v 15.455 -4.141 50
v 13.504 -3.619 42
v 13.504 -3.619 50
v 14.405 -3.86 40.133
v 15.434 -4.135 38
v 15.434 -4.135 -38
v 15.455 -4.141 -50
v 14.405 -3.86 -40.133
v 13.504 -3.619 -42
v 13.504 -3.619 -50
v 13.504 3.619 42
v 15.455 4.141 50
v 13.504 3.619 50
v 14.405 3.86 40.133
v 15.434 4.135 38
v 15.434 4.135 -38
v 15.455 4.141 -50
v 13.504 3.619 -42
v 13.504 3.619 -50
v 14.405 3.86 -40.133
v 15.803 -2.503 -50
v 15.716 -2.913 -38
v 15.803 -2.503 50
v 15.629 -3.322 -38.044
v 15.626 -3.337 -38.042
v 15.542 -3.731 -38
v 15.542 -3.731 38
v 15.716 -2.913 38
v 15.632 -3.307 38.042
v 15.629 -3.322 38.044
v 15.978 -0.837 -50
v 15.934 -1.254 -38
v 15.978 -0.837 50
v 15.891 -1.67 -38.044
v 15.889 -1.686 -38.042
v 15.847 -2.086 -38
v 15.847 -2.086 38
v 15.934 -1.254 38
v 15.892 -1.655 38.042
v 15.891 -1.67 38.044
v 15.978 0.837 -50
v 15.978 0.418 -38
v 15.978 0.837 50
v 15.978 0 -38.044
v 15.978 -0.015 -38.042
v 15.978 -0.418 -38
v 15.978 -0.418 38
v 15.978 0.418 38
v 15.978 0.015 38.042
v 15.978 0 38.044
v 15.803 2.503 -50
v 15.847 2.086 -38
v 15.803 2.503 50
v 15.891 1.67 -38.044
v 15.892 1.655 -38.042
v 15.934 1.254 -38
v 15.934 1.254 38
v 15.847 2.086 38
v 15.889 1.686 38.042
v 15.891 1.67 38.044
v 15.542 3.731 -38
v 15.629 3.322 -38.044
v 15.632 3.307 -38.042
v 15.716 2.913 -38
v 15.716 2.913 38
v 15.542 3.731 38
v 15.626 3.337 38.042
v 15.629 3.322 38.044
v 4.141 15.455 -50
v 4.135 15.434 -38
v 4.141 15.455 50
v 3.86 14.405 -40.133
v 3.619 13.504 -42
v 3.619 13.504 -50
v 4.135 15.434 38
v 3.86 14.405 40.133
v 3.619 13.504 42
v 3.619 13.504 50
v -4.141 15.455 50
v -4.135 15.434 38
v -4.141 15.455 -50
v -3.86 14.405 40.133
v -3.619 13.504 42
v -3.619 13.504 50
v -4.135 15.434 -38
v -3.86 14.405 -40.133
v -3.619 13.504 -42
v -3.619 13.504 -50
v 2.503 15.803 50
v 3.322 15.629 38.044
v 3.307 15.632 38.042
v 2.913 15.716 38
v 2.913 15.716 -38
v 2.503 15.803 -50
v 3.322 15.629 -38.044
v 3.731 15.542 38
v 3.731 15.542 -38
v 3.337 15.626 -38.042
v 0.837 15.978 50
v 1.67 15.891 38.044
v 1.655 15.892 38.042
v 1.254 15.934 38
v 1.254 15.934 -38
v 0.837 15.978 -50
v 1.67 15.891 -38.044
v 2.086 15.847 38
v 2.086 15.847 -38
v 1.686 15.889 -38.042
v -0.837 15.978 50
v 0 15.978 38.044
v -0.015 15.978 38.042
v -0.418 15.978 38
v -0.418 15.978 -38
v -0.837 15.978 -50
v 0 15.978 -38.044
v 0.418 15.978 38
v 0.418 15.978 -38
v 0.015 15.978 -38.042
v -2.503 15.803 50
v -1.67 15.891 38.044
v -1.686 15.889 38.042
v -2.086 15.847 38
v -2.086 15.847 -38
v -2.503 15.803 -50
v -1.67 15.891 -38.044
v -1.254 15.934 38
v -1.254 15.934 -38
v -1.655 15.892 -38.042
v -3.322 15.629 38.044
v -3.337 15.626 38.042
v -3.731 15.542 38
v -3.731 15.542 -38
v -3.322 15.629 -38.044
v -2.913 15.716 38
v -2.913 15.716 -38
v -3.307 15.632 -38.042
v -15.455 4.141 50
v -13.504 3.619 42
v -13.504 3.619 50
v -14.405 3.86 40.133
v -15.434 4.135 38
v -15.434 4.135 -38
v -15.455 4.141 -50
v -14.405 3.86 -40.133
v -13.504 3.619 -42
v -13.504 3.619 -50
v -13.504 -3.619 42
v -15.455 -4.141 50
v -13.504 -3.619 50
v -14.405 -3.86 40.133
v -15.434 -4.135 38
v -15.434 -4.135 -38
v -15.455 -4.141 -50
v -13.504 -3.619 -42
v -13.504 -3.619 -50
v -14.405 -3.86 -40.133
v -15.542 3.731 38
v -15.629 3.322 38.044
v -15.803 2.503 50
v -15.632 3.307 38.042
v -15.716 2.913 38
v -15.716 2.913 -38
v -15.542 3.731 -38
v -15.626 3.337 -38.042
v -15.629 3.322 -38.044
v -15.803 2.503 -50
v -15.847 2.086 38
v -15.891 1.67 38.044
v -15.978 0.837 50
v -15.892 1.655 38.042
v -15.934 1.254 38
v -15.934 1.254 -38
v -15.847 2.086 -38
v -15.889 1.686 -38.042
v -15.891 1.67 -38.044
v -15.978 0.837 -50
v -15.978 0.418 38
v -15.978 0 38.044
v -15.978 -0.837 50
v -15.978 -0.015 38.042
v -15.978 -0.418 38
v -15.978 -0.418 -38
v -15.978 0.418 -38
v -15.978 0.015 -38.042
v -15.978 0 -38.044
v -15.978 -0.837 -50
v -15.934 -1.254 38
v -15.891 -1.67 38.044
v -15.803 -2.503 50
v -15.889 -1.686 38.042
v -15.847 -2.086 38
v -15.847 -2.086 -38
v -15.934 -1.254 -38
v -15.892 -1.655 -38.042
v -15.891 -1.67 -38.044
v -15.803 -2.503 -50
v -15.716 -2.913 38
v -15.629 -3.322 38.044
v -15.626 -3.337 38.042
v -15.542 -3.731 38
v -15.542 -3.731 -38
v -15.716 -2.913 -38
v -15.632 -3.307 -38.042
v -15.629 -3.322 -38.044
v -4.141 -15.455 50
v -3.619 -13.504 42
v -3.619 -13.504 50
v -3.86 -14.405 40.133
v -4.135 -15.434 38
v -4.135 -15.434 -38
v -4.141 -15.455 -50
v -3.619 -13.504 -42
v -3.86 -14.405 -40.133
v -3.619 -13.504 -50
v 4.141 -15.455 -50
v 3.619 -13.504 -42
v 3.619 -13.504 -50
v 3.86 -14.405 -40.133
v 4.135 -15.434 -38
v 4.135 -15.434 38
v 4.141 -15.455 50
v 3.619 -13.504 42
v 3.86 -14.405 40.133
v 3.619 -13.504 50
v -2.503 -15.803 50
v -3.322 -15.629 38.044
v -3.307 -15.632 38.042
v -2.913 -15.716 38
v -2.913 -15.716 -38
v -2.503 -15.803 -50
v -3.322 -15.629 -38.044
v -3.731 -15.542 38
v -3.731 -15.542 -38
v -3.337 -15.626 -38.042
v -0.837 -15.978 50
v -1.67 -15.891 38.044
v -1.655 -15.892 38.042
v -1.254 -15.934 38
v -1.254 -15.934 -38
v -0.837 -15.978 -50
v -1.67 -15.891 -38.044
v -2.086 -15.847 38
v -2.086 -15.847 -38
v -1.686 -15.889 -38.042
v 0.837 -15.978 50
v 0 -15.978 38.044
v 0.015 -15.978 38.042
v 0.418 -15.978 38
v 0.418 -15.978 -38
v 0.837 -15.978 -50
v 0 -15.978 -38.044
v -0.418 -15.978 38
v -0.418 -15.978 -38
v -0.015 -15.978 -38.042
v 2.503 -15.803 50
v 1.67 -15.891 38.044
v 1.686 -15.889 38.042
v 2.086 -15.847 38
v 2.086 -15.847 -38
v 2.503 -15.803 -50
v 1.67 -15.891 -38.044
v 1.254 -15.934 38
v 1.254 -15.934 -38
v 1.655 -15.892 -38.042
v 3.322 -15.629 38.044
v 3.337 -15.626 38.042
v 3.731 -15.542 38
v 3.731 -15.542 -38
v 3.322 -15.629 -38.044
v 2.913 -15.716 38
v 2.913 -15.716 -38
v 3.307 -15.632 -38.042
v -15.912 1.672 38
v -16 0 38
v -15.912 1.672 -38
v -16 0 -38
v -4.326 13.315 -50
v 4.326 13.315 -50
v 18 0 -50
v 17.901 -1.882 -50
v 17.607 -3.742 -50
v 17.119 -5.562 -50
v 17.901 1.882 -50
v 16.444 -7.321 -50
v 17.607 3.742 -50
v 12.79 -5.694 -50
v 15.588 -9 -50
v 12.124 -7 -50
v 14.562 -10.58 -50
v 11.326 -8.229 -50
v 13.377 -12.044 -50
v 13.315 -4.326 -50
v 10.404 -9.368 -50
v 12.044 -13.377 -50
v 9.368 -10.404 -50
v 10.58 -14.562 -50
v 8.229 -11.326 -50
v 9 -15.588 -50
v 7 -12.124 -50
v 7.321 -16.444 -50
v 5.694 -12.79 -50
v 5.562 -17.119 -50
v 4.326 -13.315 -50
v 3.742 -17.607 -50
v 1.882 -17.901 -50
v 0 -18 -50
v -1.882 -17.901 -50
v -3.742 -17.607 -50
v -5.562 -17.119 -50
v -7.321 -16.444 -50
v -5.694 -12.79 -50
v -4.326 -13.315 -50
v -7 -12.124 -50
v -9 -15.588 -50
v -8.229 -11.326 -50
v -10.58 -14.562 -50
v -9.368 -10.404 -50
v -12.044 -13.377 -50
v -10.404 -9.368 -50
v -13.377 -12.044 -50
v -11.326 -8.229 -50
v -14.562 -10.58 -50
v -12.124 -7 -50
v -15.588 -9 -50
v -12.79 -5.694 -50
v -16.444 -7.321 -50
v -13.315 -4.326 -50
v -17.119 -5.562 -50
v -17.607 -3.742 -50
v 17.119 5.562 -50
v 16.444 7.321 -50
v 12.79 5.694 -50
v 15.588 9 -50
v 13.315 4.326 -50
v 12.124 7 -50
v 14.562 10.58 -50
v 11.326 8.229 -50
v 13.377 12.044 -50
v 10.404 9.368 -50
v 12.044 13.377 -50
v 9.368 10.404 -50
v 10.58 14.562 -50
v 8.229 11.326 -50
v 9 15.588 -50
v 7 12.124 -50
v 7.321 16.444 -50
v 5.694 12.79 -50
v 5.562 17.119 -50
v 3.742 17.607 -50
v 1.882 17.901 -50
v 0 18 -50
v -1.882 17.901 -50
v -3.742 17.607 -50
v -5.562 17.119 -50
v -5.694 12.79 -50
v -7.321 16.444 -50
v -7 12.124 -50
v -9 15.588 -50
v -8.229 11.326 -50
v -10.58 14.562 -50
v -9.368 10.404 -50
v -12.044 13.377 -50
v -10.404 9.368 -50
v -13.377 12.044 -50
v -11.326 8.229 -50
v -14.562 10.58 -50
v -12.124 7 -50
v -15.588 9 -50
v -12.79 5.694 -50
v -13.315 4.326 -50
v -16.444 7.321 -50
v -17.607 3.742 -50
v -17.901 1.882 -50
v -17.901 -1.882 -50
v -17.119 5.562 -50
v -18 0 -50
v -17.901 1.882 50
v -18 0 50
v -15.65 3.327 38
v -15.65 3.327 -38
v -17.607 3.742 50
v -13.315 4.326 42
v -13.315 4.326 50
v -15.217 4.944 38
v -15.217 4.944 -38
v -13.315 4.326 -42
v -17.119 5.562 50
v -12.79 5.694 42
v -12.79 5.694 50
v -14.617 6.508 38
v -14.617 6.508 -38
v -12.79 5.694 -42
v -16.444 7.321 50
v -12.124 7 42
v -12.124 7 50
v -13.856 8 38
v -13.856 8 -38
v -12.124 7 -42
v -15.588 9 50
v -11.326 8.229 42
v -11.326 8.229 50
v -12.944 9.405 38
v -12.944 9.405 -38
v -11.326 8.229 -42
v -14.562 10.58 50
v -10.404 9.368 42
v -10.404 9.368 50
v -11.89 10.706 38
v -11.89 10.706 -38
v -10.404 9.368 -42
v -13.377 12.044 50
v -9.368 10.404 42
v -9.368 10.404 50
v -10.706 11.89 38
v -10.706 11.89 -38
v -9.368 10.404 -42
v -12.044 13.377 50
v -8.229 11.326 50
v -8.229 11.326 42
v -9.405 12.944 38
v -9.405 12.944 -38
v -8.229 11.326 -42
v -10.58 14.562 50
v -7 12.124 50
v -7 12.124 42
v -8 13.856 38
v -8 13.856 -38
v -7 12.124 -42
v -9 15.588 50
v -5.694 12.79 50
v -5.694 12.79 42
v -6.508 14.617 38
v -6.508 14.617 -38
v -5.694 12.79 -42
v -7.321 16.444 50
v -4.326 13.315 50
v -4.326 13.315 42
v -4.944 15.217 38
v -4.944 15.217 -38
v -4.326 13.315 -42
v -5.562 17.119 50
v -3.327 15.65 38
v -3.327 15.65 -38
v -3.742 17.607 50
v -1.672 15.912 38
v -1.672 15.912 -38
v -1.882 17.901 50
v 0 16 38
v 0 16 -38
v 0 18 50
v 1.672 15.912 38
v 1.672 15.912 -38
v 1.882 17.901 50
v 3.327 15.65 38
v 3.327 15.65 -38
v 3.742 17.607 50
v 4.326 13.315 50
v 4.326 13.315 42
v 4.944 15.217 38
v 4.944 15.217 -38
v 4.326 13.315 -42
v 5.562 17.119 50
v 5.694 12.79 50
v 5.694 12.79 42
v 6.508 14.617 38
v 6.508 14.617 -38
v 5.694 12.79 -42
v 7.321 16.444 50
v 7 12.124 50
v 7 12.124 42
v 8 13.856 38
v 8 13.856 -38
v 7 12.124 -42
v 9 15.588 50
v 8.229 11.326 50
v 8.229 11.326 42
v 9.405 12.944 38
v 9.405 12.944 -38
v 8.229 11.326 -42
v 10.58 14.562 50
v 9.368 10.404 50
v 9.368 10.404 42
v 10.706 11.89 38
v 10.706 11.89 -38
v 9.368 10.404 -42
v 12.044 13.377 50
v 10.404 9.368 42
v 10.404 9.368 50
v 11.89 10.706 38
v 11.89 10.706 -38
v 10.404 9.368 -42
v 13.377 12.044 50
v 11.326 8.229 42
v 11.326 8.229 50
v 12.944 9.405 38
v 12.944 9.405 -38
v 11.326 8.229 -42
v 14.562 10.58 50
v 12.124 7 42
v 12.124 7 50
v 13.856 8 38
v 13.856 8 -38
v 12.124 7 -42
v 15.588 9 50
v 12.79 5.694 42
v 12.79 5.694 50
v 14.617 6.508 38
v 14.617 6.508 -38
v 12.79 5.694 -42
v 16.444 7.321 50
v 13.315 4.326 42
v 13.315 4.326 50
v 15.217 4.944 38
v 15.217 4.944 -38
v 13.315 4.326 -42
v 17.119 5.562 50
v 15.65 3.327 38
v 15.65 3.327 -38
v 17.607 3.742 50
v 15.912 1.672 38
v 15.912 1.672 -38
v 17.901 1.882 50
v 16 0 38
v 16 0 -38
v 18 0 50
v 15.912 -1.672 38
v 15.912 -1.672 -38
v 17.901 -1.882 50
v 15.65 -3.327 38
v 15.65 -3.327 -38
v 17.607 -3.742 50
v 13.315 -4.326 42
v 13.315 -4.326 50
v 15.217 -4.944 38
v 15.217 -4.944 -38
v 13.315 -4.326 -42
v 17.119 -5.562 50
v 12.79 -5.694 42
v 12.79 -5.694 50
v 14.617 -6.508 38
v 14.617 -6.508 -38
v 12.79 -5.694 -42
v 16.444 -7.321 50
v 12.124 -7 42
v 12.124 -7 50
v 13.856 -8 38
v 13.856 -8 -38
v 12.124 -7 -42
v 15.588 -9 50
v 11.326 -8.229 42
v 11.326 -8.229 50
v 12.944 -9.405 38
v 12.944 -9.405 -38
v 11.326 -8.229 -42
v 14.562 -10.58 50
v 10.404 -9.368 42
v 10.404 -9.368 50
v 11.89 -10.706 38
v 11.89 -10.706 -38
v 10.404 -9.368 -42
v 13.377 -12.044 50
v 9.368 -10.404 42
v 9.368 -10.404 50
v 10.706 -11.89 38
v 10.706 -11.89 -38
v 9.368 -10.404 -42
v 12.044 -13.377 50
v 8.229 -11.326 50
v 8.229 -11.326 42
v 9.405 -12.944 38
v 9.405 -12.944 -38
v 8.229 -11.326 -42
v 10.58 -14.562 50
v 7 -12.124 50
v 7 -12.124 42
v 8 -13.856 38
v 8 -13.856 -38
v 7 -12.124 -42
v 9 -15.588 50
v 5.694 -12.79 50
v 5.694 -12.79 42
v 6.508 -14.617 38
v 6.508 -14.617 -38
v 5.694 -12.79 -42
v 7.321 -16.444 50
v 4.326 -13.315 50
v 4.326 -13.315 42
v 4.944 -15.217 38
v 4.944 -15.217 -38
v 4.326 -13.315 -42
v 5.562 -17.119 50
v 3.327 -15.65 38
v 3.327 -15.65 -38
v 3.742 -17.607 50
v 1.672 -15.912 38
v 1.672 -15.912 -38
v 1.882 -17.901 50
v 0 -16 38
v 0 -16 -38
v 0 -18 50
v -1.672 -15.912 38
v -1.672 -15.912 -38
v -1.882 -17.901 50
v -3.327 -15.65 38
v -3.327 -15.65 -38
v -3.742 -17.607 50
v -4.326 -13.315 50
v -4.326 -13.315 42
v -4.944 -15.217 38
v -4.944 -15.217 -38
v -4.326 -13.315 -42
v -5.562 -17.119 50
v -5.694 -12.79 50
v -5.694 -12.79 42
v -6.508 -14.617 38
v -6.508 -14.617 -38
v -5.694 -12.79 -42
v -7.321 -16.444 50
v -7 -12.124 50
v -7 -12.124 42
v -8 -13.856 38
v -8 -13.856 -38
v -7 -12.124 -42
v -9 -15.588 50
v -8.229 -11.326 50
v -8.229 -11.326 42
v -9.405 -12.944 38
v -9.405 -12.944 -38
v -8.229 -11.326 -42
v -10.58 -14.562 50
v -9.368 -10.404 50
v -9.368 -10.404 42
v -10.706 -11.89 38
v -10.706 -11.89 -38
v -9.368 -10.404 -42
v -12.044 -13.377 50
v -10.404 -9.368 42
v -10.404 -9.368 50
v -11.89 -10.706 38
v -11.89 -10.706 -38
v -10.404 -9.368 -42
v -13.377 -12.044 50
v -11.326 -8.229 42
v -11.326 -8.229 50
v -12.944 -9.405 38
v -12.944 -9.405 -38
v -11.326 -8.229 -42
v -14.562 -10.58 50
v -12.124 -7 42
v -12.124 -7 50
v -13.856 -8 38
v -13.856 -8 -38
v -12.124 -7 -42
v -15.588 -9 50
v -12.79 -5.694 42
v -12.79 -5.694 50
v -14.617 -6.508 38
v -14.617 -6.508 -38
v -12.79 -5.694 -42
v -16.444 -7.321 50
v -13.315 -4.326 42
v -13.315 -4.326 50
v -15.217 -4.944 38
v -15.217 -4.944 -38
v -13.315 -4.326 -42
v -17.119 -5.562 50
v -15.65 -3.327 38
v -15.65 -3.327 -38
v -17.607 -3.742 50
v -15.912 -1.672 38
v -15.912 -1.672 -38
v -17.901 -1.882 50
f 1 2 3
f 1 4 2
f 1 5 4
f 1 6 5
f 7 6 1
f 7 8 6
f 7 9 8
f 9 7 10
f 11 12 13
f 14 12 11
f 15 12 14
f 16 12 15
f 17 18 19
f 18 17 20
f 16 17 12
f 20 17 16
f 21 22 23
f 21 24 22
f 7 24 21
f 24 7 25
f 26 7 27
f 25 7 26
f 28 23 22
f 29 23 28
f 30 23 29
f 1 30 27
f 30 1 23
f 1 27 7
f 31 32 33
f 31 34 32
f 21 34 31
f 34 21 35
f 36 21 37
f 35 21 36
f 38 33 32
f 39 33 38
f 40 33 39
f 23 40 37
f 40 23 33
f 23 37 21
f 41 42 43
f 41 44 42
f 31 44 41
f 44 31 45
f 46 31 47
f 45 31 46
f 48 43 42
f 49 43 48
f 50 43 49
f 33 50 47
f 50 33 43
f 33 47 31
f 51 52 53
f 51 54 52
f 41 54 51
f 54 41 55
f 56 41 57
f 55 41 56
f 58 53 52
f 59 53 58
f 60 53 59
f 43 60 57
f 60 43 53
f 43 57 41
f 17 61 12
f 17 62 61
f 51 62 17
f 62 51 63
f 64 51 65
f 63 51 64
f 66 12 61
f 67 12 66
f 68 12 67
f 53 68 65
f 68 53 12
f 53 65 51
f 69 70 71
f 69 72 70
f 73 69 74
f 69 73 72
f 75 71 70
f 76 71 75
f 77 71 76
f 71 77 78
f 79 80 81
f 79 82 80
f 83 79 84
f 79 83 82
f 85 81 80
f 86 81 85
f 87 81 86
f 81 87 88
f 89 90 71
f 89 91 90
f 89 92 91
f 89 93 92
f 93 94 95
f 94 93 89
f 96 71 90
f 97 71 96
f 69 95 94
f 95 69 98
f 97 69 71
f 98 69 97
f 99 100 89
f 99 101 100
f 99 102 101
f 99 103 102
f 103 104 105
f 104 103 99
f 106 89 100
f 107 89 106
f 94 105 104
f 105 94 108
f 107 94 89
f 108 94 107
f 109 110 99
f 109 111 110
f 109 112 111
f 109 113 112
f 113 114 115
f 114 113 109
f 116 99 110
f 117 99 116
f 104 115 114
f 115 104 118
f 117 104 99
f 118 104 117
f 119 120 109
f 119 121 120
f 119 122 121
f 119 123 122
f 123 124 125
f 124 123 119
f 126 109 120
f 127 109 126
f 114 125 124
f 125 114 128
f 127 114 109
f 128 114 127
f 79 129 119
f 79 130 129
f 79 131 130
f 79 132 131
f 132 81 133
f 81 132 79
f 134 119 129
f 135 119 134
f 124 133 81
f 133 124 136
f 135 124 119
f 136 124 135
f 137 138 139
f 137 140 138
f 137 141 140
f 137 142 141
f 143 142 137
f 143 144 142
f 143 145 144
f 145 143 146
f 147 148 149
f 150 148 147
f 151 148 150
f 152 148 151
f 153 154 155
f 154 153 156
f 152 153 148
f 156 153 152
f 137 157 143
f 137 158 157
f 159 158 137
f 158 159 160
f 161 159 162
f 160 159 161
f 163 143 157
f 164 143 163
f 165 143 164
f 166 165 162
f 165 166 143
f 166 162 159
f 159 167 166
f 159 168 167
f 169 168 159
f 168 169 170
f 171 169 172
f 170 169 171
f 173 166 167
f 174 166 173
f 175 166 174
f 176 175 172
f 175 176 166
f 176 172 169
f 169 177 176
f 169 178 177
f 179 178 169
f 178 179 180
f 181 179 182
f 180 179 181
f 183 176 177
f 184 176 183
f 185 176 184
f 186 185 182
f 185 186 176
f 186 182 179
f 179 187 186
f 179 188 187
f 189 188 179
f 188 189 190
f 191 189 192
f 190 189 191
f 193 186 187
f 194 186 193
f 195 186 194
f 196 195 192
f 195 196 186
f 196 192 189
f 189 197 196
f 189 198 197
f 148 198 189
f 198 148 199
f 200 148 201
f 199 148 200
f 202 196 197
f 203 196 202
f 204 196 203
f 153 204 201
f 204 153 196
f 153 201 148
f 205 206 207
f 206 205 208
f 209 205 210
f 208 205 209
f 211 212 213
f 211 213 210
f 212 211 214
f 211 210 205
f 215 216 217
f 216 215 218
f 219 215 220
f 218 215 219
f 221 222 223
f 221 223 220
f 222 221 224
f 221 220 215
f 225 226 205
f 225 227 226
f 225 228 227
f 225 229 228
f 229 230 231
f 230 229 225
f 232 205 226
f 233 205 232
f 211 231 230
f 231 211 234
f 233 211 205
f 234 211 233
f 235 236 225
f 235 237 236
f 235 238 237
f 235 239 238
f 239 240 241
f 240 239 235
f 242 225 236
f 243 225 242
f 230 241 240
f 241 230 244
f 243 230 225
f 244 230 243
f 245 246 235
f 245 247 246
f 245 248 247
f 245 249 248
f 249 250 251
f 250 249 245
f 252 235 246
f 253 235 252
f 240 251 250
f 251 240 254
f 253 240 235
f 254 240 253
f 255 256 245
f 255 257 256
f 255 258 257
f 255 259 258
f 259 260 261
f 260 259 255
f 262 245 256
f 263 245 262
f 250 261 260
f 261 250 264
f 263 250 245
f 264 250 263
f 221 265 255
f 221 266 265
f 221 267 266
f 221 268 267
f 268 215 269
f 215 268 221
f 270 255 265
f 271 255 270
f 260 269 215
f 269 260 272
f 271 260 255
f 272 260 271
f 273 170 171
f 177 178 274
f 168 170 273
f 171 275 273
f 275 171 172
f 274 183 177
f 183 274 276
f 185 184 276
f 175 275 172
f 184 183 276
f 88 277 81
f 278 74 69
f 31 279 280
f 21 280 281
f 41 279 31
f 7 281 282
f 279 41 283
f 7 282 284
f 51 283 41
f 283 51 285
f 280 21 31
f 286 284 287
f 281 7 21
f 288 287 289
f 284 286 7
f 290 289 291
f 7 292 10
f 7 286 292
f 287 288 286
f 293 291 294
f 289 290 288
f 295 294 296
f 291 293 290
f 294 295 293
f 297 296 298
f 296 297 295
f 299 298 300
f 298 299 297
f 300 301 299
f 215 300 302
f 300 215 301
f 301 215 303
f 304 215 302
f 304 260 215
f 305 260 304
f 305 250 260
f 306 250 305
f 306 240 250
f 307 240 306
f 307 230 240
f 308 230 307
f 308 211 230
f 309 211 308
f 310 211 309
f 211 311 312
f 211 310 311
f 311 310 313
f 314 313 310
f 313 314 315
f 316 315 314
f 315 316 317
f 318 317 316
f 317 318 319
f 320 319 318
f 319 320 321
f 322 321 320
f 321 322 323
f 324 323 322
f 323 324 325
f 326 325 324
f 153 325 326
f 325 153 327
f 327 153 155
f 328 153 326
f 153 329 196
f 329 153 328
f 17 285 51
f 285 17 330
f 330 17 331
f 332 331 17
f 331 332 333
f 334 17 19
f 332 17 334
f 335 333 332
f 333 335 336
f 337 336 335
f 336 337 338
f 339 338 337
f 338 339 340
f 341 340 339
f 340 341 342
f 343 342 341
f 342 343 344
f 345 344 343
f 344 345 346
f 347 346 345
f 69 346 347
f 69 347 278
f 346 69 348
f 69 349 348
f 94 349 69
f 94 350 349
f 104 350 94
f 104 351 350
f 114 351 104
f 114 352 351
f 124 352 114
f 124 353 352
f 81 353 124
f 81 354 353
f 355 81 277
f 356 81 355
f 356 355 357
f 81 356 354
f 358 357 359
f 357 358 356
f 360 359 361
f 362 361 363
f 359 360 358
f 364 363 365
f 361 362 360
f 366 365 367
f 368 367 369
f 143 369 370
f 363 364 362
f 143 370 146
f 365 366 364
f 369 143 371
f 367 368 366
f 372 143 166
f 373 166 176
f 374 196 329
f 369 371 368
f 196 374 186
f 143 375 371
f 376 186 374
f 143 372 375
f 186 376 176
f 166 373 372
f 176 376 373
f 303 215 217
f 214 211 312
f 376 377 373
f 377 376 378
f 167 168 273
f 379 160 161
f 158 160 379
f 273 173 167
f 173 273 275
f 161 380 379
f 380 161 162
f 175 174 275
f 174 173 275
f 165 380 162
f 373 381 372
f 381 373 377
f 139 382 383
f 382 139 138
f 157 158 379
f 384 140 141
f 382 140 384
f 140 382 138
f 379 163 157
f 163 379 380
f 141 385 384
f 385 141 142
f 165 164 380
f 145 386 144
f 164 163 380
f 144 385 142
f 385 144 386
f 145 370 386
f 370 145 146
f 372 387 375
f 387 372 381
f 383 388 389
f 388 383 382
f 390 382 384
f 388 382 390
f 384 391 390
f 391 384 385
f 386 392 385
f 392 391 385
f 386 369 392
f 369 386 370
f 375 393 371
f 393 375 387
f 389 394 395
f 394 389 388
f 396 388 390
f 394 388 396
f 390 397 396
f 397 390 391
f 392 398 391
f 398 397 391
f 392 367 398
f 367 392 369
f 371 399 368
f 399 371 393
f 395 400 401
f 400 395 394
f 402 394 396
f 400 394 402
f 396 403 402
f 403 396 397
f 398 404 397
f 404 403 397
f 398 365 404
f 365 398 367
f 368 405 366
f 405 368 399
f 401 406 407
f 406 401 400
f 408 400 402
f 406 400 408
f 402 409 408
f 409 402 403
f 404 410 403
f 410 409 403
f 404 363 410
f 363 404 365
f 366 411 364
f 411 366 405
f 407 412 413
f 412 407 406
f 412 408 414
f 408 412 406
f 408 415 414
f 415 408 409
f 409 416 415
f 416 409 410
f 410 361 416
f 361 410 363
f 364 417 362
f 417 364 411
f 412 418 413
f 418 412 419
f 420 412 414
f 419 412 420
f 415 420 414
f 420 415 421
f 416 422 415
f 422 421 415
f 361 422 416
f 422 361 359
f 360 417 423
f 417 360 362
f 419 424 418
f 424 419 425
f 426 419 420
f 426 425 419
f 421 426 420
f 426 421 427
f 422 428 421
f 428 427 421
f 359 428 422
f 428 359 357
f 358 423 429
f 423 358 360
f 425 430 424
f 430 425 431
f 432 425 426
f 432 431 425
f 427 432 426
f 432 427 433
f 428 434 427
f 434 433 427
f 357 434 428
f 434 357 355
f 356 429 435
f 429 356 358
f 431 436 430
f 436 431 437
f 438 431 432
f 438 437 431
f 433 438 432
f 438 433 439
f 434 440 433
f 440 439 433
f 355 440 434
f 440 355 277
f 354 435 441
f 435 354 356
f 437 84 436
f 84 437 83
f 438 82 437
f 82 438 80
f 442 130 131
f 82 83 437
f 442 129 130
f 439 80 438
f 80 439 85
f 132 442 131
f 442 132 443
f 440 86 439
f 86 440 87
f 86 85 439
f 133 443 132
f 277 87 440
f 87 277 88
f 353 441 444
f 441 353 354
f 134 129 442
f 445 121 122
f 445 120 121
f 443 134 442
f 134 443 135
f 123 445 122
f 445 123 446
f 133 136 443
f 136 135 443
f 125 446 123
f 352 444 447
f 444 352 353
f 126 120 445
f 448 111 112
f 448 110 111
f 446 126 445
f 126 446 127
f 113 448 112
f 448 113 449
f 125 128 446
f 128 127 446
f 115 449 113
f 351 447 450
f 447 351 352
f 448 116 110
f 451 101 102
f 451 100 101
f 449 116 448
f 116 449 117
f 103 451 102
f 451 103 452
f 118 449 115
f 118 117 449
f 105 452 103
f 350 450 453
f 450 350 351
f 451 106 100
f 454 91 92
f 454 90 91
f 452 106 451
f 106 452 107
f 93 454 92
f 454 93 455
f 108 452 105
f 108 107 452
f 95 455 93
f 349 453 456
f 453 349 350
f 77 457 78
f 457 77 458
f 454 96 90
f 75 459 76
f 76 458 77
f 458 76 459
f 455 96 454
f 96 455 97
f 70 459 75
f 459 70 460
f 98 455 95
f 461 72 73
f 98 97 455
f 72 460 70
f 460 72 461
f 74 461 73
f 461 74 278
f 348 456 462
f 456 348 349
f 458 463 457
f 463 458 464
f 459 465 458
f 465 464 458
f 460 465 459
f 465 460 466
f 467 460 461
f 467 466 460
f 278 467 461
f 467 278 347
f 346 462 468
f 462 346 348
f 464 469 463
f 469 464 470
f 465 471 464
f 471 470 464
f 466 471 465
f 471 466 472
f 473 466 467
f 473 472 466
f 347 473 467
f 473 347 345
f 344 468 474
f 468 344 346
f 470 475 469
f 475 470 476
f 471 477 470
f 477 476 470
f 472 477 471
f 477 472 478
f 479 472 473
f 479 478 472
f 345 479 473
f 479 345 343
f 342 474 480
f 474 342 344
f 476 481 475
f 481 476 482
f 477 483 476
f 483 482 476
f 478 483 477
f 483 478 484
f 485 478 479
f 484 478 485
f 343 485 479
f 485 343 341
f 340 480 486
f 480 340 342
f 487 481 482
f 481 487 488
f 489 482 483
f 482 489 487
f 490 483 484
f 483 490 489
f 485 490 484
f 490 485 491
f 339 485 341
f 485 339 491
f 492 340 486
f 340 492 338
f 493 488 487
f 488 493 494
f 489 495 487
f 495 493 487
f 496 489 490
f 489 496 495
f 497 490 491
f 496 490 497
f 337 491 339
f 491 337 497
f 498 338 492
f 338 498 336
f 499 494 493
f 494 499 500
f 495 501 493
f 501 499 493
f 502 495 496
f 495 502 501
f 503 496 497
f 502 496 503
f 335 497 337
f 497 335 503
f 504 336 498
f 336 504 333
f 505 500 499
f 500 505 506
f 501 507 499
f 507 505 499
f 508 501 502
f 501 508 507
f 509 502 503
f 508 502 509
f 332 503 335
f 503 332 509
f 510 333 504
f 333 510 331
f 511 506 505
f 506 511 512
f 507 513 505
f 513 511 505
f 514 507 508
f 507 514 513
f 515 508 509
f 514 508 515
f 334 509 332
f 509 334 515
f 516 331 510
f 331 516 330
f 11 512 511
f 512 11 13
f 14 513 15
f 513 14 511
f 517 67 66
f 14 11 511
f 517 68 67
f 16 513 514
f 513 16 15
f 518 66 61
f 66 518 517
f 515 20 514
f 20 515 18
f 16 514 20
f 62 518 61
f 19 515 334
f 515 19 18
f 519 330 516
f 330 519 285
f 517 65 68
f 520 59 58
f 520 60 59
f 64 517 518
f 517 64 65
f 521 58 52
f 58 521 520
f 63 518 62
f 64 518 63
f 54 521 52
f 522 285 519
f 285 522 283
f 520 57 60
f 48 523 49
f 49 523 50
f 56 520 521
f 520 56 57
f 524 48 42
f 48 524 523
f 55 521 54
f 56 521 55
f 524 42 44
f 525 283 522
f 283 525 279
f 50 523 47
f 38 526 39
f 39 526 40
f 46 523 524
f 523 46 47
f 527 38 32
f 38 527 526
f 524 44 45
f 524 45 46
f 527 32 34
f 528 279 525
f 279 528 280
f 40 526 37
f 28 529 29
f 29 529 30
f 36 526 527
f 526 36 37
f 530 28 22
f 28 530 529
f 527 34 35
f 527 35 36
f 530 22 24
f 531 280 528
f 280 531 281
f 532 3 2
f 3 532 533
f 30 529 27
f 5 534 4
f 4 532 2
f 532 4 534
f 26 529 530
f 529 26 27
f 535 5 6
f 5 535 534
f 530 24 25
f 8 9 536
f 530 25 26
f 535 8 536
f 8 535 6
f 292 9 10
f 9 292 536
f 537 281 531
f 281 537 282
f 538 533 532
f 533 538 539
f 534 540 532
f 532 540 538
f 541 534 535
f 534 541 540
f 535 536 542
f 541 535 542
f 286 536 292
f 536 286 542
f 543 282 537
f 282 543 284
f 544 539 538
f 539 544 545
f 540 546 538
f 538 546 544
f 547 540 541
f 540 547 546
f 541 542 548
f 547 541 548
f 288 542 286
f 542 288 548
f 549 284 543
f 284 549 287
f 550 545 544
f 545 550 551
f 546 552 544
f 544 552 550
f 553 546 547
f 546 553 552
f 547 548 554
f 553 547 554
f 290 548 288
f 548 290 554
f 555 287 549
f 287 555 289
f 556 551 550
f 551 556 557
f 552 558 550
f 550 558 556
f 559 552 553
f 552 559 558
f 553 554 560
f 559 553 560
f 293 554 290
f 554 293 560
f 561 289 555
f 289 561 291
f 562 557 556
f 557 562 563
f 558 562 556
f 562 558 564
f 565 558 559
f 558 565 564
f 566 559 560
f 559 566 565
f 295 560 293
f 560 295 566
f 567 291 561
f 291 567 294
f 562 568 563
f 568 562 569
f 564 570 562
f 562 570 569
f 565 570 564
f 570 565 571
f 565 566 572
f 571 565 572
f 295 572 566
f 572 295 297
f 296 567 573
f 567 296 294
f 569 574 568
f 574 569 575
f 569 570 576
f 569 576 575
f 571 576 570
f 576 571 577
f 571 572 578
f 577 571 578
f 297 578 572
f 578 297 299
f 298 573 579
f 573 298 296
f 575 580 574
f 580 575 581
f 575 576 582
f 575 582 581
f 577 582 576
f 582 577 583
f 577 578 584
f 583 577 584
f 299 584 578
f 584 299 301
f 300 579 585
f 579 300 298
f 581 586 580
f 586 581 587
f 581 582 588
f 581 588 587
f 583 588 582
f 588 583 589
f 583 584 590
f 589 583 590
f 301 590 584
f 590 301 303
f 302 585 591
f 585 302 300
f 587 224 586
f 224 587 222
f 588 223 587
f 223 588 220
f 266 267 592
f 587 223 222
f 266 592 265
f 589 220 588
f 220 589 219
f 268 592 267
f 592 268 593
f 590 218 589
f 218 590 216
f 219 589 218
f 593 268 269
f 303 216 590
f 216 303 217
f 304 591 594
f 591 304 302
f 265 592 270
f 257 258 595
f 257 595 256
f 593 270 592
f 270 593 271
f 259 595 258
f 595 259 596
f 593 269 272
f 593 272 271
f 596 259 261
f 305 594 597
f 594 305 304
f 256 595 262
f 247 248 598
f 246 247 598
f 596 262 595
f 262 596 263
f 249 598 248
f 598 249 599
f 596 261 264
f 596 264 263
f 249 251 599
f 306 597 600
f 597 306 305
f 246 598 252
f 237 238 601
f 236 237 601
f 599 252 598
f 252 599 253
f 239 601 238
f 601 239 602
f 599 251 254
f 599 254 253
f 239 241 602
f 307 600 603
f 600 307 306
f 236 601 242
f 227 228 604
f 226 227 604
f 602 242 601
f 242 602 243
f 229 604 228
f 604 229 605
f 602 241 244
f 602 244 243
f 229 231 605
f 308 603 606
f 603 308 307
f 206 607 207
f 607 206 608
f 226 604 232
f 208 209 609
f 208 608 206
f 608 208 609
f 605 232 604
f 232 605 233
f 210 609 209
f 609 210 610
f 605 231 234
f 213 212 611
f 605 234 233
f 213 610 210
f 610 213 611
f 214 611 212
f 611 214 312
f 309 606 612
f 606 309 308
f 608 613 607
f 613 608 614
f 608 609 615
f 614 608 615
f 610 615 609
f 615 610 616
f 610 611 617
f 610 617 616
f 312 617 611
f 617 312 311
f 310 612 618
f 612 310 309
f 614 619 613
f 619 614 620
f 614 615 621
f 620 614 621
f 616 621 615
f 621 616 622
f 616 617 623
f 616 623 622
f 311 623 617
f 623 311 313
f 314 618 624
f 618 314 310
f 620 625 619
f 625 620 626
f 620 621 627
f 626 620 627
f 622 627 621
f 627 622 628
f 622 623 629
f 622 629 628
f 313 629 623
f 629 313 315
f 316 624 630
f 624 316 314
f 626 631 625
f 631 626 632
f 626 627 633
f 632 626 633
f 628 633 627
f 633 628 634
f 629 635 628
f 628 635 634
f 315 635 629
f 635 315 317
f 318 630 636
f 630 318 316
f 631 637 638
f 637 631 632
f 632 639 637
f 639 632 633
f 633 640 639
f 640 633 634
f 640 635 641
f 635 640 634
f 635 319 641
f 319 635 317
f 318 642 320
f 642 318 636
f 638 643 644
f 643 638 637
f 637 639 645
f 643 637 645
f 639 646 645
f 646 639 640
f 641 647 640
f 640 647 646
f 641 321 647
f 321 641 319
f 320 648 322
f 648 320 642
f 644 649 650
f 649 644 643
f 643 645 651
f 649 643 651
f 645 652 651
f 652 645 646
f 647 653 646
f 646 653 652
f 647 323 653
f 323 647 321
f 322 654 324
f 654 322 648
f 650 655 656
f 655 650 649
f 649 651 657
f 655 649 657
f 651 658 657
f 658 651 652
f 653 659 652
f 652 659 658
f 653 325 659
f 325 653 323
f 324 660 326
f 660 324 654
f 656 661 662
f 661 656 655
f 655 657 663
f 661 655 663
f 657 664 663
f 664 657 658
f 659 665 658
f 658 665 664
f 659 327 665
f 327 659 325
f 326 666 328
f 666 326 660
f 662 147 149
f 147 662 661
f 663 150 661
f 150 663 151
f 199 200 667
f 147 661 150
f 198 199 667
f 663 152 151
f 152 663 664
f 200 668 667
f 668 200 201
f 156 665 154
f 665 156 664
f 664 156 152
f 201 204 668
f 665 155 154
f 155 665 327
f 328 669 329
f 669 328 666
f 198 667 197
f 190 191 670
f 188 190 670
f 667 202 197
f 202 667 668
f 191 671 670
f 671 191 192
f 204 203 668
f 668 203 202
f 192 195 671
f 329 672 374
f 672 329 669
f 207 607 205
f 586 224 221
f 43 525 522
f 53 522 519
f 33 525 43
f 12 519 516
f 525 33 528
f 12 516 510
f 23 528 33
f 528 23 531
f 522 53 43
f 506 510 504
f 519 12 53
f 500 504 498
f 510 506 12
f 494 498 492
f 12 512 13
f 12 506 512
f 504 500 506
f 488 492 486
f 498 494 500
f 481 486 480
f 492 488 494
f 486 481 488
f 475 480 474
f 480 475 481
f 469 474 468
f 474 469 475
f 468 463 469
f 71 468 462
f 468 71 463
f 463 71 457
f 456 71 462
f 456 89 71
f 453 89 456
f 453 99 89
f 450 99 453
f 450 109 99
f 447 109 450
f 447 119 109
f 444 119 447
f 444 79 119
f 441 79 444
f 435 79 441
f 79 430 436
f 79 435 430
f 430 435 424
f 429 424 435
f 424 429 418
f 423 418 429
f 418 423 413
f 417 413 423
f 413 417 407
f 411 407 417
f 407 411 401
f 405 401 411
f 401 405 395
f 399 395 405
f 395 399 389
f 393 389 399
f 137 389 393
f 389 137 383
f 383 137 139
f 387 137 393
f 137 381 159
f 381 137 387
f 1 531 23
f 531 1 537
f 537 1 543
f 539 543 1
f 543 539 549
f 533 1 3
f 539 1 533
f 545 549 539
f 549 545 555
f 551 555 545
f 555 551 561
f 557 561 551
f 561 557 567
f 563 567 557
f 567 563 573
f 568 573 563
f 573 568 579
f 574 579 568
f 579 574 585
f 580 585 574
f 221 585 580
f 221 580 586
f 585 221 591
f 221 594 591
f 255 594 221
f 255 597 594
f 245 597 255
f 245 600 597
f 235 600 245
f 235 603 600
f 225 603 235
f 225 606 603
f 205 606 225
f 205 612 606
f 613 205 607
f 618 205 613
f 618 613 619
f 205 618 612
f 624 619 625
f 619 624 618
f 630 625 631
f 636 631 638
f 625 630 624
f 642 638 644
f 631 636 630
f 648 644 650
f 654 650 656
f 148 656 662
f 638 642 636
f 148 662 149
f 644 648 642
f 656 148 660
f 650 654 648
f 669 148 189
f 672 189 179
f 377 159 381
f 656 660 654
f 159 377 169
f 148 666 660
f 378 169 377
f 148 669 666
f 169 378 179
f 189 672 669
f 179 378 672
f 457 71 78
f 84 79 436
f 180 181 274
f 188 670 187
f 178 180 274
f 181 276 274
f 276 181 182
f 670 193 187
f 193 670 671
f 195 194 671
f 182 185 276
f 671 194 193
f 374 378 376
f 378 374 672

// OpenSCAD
WIDTH=2;

HEIGHT=100;

SIDES_HEIGHT=8;

SIDES_RADIO=2;

SIDES_WIDTH=4;

CYLINDER_DIAM = 36;

CYLINDER_RADIO = CYLINDER_DIAM / 2;

// 2D points of the cylinder section.
SECTION_POINTS = [[0, -HEIGHT/2],
                  [-SIDES_WIDTH, -HEIGHT/2],
                  [-SIDES_WIDTH, -HEIGHT/2 + SIDES_HEIGHT],
                  [-(SIDES_WIDTH-WIDTH), 
                    -HEIGHT/2 + SIDES_HEIGHT + 2*(SIDES_WIDTH-WIDTH)],
                  [-(SIDES_WIDTH-WIDTH), 
                    +HEIGHT/2 - SIDES_HEIGHT - 2*(SIDES_WIDTH-WIDTH)],
                  [-SIDES_WIDTH, +HEIGHT/2 - SIDES_HEIGHT],
                  [-SIDES_WIDTH, +HEIGHT/2],
                  [0, +HEIGHT/2]];


SECTOR_ANGLE = 360/12;    

SECTOR_POINTS = [[0, -HEIGHT/2-1], 
                 [-SIDES_WIDTH/2 - 1, -HEIGHT/2-1],
                 [-SIDES_WIDTH/2 - 1, +HEIGHT/2+1],
                 [0, +HEIGHT/2+1]];

difference()
{
rotate_extrude($fn=60)
  translate([CYLINDER_RADIO,0,0])
    polygon(SECTION_POINTS);

for (i = [0, 90, 180, 270])
{
rotate([0,0,i])
  rotate([0,0,-SECTOR_ANGLE/2])
    rotate_extrude(angle=SECTOR_ANGLE, $fn=60)
      translate([CYLINDER_RADIO - SIDES_WIDTH/2, 0, 0])
        polygon(SECTOR_POINTS);
}
}
      
        
          
            
//*rotate_extrude($fn=60)
//{
//  translate([CYLINDER_RADIO - WIDTH/2,0,0])
//  {
//    square([WIDTH, HEIGHT], center=true);
//    for (i = [-1, 1])
//    {
//      translate([-WIDTH/2 - (SIDES_WIDTH-WIDTH)/2, i * (-HEIGHT/2 + SIDES_HEIGHT/2), 0])
//        square([(SIDES_WIDTH-WIDTH), SIDES_HEIGHT], center=true);
//      translate([-WIDTH/2, i * (-HEIGHT/2 + SIDES_HEIGHT), 0])
//        circle(SIDES_RADIO, $fn=30);
//    }
//  }
//}
